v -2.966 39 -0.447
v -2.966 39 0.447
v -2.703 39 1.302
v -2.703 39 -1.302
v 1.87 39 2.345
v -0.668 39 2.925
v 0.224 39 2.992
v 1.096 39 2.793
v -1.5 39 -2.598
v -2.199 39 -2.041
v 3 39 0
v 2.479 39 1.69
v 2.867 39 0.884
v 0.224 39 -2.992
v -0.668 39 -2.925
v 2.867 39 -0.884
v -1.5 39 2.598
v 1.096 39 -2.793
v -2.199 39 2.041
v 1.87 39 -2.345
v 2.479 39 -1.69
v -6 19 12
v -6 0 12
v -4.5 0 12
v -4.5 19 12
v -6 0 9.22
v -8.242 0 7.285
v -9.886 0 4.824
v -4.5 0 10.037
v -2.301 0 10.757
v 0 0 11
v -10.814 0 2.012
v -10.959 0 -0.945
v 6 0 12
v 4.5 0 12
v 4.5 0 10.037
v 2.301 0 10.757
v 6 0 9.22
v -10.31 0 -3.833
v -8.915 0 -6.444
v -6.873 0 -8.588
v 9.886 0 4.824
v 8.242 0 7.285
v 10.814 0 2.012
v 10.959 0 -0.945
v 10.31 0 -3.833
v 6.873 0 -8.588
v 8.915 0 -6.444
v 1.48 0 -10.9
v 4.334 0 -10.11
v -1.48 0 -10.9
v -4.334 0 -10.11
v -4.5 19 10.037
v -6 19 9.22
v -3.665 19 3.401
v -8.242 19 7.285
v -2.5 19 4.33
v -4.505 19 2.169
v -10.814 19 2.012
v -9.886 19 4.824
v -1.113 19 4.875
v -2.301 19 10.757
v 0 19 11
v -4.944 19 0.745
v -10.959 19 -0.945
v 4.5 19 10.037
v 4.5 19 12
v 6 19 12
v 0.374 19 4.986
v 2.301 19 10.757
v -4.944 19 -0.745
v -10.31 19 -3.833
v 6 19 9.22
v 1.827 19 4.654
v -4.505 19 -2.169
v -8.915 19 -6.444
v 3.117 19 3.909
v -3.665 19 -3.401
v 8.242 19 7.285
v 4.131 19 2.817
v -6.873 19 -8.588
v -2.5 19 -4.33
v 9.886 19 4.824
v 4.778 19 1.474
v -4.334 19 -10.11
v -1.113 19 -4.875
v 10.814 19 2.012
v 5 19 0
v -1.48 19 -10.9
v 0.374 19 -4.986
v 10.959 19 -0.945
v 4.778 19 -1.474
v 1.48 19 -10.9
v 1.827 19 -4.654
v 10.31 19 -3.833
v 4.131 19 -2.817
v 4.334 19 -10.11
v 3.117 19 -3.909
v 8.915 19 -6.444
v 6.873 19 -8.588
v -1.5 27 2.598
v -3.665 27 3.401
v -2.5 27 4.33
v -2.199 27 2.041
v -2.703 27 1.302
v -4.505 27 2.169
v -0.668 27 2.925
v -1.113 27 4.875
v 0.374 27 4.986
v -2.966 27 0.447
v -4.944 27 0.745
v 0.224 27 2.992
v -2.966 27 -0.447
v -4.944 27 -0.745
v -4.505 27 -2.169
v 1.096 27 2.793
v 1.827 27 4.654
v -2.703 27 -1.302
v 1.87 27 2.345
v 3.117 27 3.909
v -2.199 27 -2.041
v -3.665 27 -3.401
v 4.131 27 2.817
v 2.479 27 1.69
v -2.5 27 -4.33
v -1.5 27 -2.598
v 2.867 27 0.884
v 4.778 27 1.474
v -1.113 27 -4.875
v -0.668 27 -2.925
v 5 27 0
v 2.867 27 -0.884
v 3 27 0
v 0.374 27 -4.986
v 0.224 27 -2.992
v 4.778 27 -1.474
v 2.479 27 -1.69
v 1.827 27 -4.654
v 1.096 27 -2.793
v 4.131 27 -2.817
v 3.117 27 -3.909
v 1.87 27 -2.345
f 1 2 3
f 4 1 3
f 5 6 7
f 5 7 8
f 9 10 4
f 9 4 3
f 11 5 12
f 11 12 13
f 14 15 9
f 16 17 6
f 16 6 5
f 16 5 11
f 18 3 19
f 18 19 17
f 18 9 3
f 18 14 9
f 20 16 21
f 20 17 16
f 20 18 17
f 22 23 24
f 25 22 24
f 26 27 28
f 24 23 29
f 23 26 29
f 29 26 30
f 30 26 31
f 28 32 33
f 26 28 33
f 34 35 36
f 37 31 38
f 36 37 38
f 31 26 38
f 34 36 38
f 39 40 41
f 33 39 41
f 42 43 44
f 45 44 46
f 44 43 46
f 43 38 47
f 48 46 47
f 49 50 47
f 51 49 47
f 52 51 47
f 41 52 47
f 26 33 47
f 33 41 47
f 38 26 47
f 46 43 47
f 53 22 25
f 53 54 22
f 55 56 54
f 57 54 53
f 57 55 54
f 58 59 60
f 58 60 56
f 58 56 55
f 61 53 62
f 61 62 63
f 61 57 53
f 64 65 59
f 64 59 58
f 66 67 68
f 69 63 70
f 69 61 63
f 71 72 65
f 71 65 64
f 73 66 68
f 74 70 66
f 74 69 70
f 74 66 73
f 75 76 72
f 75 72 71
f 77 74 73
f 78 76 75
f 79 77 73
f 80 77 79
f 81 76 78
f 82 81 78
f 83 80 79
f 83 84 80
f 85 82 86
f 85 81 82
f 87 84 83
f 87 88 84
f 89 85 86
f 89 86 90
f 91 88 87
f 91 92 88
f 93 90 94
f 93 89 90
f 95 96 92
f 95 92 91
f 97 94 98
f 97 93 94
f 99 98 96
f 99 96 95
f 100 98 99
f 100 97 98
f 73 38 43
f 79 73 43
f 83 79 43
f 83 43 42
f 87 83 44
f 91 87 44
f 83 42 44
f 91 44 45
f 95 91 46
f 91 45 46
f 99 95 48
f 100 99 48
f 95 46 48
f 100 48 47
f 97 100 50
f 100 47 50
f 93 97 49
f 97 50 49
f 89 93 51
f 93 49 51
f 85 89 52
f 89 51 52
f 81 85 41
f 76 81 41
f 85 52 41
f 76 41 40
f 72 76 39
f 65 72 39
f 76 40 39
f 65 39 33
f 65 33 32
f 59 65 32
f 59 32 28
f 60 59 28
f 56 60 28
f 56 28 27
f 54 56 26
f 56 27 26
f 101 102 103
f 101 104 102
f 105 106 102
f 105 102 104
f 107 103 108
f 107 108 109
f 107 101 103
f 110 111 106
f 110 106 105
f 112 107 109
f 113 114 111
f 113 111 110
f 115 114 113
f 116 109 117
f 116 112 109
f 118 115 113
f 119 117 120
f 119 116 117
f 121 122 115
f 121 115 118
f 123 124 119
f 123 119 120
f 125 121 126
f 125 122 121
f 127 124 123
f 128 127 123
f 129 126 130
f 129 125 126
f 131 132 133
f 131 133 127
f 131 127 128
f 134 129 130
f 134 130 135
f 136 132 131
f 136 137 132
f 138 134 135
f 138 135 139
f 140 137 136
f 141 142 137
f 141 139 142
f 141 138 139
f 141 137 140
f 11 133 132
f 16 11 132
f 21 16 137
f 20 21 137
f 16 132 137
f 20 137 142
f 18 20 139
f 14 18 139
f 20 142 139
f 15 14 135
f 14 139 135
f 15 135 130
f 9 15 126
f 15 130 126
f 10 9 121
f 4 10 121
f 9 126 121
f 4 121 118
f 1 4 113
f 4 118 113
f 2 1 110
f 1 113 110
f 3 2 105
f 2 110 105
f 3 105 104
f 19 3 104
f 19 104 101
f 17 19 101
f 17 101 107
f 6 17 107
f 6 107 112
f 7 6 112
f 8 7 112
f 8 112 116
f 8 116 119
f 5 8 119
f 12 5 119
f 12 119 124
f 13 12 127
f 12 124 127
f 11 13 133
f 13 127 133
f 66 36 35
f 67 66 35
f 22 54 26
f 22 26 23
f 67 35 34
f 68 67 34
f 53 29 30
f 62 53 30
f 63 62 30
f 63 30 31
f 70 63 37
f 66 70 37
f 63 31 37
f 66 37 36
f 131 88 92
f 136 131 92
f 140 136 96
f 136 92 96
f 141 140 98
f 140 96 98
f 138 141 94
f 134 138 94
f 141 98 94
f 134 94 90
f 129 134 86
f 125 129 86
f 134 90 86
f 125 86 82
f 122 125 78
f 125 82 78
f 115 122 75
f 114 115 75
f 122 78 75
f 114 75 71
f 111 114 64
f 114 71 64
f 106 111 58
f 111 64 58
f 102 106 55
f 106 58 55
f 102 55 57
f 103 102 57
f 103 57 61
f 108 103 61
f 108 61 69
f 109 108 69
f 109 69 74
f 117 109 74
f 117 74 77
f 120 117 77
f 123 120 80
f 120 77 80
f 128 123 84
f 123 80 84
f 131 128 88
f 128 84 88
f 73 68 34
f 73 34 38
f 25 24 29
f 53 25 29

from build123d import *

# Parameters (mm, degrees)
BOSS_EXTRUDE1_DEPTH = 19
SKETCH2_R           = 5
BOSS_EXTRUDE2_DEPTH = 8
SKETCH3_R           = 3
BOSS_EXTRUDE3_DEPTH = 12


with BuildPart() as part:
    # Sketch1 → Boss-Extrude1 (new body)
    with BuildSketch(Plane(origin=(0, 0, 0), x_dir=(1, 0, 0), z_dir=(0, 1, 0))):
        with BuildLine():
            Line((-6, -12), (-4.5, -12))
            Line((-4.5, -12), (-4.5, -10.03742995))
            ThreePointArc((-4.5, -10.03742995), (0, -11), (4.5, -10.03742995))
            Line((4.5, -10.03742995), (4.5, -12))
            Line((4.5, -12), (6, -12))
            Line((6, -12), (6, -9.219544457))
            ThreePointArc((6, -9.219544457), (0, 11), (-6, -9.219544457))
            Line((-6, -9.219544457), (-6, -12))
        make_face()
    extrude(amount=BOSS_EXTRUDE1_DEPTH)

    # Sketch2 → Boss-Extrude2 (add)
    with BuildSketch(Plane(origin=(0, 19, 0), x_dir=(1, 0, 0), z_dir=(0, 1, 0))):
        Circle(SKETCH2_R)
    extrude(amount=BOSS_EXTRUDE2_DEPTH)

    # Sketch3 → Boss-Extrude3 (add)
    with BuildSketch(Plane(origin=(0, 27, 0), x_dir=(1, 0, 0), z_dir=(0, 1, 0))):
        Circle(SKETCH3_R)
    extrude(amount=BOSS_EXTRUDE3_DEPTH)


solid = part.part
